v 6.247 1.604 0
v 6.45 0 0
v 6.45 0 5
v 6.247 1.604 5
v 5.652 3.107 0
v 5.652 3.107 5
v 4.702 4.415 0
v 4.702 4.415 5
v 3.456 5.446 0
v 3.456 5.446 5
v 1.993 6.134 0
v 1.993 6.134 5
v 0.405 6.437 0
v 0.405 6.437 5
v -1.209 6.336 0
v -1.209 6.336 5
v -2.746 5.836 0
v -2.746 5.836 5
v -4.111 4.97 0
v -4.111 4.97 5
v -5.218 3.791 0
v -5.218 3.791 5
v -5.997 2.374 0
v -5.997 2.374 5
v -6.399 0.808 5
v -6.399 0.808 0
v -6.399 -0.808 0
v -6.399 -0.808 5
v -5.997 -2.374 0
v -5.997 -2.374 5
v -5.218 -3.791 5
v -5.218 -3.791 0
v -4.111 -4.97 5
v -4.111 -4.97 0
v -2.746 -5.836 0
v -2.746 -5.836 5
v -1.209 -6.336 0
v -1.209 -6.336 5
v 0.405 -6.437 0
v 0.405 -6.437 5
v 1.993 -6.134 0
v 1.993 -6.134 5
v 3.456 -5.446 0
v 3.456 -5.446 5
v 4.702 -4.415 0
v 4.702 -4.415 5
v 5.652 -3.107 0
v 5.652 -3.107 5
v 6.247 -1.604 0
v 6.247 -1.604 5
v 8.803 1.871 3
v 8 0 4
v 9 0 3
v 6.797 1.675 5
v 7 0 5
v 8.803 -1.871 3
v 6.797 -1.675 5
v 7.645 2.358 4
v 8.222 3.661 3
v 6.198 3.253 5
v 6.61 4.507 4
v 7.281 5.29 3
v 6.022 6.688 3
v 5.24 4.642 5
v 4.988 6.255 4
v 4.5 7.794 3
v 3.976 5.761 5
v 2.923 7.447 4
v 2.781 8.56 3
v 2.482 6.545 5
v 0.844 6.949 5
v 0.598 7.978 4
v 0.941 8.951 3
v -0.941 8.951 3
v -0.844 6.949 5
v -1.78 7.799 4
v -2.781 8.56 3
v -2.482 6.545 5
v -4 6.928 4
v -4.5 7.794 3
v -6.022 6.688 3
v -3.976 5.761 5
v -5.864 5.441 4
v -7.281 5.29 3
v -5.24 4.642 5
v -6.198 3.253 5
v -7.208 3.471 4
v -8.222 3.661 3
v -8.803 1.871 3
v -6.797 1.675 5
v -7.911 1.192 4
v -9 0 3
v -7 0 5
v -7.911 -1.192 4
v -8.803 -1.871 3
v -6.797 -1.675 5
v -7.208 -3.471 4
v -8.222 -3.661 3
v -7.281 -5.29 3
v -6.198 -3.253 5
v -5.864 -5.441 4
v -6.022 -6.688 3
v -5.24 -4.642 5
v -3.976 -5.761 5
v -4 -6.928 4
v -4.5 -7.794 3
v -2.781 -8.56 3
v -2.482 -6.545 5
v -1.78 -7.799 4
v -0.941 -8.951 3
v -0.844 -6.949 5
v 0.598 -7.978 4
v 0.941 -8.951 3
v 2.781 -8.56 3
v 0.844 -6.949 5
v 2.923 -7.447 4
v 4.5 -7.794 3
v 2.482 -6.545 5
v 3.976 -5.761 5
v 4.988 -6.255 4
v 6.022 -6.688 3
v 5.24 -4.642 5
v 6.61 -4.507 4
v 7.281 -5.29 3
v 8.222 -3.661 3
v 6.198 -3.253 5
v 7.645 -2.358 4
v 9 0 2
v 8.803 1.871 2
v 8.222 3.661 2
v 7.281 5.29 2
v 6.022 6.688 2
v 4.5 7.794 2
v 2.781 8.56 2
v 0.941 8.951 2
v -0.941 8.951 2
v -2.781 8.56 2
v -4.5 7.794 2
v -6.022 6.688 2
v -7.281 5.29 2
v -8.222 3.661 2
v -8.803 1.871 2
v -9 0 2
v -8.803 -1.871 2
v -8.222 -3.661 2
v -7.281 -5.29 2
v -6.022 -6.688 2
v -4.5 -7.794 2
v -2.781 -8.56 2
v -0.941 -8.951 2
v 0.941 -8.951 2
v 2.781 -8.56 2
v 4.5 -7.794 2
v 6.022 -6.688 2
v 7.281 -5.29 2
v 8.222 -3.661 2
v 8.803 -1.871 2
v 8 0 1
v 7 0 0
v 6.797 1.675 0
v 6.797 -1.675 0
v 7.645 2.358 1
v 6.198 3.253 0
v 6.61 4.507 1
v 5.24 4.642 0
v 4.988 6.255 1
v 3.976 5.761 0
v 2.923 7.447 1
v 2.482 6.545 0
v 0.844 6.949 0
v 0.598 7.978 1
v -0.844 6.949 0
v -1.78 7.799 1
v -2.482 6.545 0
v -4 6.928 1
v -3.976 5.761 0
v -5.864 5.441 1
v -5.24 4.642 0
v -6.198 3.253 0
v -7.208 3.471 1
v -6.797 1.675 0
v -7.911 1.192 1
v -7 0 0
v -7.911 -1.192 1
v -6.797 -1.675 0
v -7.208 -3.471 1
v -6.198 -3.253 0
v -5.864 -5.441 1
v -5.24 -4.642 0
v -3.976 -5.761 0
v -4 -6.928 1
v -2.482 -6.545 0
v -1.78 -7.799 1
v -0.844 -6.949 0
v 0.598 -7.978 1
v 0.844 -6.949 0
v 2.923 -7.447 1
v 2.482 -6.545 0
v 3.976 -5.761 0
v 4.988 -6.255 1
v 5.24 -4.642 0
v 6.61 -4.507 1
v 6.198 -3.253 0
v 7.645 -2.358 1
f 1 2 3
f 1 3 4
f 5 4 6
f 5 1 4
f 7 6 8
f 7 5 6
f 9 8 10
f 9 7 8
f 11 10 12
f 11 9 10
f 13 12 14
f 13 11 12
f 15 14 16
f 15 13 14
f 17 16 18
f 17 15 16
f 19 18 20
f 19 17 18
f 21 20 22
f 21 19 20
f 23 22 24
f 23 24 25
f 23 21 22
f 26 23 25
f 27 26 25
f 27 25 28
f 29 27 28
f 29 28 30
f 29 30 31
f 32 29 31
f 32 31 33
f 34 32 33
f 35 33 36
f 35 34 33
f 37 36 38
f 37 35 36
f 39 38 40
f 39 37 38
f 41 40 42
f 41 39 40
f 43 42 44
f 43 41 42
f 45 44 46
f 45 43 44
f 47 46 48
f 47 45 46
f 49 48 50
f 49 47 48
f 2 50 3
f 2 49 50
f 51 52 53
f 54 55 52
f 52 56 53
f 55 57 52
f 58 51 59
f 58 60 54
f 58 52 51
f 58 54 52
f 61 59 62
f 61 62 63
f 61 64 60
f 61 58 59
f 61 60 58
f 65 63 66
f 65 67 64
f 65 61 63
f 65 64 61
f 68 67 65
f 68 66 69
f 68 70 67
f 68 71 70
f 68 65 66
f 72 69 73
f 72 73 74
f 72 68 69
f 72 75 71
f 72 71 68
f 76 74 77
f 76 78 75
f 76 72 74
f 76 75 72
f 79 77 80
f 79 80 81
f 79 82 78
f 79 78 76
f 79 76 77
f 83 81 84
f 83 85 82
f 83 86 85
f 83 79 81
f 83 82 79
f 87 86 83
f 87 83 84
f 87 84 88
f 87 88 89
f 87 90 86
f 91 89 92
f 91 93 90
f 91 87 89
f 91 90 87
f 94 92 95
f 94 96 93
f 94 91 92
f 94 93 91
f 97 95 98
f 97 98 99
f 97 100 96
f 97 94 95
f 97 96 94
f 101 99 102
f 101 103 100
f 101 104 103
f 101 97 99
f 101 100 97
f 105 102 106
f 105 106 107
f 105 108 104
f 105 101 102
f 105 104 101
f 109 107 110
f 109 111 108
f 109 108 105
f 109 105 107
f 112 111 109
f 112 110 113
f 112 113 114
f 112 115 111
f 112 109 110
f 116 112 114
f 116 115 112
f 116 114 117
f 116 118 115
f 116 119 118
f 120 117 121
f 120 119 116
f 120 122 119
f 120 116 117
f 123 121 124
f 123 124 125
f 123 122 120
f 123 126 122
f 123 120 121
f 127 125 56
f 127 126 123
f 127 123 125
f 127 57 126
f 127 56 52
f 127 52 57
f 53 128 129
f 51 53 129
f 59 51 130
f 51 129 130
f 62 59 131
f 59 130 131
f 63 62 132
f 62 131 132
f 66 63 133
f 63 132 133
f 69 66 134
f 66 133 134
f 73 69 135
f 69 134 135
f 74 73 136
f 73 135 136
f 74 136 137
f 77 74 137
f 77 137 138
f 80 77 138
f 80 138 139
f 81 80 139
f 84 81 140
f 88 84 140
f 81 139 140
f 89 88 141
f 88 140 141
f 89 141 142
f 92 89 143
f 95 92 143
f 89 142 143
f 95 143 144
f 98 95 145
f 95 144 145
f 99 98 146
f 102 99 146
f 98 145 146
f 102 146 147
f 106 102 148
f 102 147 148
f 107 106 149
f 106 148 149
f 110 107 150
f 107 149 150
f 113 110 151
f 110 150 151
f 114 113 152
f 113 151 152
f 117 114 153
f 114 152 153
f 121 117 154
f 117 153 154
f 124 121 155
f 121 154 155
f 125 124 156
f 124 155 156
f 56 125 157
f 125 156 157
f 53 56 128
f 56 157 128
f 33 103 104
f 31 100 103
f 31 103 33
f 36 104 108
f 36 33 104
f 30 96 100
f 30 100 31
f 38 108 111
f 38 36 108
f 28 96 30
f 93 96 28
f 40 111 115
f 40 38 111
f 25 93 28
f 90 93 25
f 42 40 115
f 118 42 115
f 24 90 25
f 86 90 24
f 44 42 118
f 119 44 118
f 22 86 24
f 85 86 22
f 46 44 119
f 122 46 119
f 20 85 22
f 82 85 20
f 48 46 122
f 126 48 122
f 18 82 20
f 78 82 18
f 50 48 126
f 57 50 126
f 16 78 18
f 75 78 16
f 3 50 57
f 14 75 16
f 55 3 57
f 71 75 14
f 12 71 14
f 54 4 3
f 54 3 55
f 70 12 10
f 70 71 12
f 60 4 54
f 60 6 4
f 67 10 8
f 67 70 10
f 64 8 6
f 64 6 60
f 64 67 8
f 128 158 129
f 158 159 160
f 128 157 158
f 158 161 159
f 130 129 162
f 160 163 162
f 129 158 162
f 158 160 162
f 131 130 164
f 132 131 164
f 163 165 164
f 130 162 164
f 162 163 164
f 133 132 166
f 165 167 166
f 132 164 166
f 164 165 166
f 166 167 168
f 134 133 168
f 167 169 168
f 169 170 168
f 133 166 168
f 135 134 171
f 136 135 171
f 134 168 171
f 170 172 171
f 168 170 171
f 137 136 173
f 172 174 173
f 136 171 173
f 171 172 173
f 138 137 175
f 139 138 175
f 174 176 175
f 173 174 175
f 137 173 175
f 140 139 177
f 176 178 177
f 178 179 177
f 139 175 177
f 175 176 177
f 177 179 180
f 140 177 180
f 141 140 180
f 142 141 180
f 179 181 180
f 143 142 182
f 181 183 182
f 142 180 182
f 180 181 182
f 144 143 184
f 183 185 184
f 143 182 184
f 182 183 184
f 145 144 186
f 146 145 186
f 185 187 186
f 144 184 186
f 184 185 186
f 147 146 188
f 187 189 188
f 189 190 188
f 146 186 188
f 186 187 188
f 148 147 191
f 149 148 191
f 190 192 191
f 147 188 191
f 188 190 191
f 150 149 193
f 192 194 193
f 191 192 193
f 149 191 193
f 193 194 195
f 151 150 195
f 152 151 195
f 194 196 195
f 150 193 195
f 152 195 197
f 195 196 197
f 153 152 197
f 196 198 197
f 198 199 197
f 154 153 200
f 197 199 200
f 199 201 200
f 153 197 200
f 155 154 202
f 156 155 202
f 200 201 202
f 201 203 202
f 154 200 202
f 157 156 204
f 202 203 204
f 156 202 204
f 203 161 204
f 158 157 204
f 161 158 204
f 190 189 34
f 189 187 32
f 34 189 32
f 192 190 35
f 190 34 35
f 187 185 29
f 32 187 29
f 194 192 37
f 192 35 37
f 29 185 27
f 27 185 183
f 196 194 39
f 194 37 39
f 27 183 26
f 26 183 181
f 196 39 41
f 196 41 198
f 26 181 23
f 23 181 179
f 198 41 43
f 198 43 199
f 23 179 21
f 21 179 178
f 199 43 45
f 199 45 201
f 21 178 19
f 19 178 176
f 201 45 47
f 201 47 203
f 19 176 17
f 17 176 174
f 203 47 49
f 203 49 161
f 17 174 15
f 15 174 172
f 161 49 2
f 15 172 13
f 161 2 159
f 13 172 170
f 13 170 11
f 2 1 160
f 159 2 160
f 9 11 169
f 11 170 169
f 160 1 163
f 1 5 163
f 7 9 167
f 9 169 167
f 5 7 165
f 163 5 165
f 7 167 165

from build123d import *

# Parameters (mm, degrees)
CYLINDER001_R     = 6.45
CYLINDER001_DEPTH = 5
CYLINDER002_R     = 9
CYLINDER002_DEPTH = 5
CHAMFER_SIZE      = 2


with BuildPart() as exterior:
    # Cylinder001 → Cylinder001 (new body)
    with BuildSketch(Plane.XY):
        Circle(CYLINDER001_R)
    extrude(amount=CYLINDER001_DEPTH)


with BuildPart() as cut:
    # Cylinder002 → Cylinder002 (new body)
    with BuildSketch(Plane.XY):
        Circle(CYLINDER002_R)
    extrude(amount=CYLINDER002_DEPTH)

    # Chamfer
    chamfer_edges = [cut.edges().sort_by_distance(p)[0] for p in [
        (-9, 0, 5),
        (-9, 0, 0),
    ]]
    chamfer(chamfer_edges, length=CHAMFER_SIZE)

    # Cut: cut exterior
    add(exterior.part, mode=Mode.SUBTRACT)


solid = cut.part
